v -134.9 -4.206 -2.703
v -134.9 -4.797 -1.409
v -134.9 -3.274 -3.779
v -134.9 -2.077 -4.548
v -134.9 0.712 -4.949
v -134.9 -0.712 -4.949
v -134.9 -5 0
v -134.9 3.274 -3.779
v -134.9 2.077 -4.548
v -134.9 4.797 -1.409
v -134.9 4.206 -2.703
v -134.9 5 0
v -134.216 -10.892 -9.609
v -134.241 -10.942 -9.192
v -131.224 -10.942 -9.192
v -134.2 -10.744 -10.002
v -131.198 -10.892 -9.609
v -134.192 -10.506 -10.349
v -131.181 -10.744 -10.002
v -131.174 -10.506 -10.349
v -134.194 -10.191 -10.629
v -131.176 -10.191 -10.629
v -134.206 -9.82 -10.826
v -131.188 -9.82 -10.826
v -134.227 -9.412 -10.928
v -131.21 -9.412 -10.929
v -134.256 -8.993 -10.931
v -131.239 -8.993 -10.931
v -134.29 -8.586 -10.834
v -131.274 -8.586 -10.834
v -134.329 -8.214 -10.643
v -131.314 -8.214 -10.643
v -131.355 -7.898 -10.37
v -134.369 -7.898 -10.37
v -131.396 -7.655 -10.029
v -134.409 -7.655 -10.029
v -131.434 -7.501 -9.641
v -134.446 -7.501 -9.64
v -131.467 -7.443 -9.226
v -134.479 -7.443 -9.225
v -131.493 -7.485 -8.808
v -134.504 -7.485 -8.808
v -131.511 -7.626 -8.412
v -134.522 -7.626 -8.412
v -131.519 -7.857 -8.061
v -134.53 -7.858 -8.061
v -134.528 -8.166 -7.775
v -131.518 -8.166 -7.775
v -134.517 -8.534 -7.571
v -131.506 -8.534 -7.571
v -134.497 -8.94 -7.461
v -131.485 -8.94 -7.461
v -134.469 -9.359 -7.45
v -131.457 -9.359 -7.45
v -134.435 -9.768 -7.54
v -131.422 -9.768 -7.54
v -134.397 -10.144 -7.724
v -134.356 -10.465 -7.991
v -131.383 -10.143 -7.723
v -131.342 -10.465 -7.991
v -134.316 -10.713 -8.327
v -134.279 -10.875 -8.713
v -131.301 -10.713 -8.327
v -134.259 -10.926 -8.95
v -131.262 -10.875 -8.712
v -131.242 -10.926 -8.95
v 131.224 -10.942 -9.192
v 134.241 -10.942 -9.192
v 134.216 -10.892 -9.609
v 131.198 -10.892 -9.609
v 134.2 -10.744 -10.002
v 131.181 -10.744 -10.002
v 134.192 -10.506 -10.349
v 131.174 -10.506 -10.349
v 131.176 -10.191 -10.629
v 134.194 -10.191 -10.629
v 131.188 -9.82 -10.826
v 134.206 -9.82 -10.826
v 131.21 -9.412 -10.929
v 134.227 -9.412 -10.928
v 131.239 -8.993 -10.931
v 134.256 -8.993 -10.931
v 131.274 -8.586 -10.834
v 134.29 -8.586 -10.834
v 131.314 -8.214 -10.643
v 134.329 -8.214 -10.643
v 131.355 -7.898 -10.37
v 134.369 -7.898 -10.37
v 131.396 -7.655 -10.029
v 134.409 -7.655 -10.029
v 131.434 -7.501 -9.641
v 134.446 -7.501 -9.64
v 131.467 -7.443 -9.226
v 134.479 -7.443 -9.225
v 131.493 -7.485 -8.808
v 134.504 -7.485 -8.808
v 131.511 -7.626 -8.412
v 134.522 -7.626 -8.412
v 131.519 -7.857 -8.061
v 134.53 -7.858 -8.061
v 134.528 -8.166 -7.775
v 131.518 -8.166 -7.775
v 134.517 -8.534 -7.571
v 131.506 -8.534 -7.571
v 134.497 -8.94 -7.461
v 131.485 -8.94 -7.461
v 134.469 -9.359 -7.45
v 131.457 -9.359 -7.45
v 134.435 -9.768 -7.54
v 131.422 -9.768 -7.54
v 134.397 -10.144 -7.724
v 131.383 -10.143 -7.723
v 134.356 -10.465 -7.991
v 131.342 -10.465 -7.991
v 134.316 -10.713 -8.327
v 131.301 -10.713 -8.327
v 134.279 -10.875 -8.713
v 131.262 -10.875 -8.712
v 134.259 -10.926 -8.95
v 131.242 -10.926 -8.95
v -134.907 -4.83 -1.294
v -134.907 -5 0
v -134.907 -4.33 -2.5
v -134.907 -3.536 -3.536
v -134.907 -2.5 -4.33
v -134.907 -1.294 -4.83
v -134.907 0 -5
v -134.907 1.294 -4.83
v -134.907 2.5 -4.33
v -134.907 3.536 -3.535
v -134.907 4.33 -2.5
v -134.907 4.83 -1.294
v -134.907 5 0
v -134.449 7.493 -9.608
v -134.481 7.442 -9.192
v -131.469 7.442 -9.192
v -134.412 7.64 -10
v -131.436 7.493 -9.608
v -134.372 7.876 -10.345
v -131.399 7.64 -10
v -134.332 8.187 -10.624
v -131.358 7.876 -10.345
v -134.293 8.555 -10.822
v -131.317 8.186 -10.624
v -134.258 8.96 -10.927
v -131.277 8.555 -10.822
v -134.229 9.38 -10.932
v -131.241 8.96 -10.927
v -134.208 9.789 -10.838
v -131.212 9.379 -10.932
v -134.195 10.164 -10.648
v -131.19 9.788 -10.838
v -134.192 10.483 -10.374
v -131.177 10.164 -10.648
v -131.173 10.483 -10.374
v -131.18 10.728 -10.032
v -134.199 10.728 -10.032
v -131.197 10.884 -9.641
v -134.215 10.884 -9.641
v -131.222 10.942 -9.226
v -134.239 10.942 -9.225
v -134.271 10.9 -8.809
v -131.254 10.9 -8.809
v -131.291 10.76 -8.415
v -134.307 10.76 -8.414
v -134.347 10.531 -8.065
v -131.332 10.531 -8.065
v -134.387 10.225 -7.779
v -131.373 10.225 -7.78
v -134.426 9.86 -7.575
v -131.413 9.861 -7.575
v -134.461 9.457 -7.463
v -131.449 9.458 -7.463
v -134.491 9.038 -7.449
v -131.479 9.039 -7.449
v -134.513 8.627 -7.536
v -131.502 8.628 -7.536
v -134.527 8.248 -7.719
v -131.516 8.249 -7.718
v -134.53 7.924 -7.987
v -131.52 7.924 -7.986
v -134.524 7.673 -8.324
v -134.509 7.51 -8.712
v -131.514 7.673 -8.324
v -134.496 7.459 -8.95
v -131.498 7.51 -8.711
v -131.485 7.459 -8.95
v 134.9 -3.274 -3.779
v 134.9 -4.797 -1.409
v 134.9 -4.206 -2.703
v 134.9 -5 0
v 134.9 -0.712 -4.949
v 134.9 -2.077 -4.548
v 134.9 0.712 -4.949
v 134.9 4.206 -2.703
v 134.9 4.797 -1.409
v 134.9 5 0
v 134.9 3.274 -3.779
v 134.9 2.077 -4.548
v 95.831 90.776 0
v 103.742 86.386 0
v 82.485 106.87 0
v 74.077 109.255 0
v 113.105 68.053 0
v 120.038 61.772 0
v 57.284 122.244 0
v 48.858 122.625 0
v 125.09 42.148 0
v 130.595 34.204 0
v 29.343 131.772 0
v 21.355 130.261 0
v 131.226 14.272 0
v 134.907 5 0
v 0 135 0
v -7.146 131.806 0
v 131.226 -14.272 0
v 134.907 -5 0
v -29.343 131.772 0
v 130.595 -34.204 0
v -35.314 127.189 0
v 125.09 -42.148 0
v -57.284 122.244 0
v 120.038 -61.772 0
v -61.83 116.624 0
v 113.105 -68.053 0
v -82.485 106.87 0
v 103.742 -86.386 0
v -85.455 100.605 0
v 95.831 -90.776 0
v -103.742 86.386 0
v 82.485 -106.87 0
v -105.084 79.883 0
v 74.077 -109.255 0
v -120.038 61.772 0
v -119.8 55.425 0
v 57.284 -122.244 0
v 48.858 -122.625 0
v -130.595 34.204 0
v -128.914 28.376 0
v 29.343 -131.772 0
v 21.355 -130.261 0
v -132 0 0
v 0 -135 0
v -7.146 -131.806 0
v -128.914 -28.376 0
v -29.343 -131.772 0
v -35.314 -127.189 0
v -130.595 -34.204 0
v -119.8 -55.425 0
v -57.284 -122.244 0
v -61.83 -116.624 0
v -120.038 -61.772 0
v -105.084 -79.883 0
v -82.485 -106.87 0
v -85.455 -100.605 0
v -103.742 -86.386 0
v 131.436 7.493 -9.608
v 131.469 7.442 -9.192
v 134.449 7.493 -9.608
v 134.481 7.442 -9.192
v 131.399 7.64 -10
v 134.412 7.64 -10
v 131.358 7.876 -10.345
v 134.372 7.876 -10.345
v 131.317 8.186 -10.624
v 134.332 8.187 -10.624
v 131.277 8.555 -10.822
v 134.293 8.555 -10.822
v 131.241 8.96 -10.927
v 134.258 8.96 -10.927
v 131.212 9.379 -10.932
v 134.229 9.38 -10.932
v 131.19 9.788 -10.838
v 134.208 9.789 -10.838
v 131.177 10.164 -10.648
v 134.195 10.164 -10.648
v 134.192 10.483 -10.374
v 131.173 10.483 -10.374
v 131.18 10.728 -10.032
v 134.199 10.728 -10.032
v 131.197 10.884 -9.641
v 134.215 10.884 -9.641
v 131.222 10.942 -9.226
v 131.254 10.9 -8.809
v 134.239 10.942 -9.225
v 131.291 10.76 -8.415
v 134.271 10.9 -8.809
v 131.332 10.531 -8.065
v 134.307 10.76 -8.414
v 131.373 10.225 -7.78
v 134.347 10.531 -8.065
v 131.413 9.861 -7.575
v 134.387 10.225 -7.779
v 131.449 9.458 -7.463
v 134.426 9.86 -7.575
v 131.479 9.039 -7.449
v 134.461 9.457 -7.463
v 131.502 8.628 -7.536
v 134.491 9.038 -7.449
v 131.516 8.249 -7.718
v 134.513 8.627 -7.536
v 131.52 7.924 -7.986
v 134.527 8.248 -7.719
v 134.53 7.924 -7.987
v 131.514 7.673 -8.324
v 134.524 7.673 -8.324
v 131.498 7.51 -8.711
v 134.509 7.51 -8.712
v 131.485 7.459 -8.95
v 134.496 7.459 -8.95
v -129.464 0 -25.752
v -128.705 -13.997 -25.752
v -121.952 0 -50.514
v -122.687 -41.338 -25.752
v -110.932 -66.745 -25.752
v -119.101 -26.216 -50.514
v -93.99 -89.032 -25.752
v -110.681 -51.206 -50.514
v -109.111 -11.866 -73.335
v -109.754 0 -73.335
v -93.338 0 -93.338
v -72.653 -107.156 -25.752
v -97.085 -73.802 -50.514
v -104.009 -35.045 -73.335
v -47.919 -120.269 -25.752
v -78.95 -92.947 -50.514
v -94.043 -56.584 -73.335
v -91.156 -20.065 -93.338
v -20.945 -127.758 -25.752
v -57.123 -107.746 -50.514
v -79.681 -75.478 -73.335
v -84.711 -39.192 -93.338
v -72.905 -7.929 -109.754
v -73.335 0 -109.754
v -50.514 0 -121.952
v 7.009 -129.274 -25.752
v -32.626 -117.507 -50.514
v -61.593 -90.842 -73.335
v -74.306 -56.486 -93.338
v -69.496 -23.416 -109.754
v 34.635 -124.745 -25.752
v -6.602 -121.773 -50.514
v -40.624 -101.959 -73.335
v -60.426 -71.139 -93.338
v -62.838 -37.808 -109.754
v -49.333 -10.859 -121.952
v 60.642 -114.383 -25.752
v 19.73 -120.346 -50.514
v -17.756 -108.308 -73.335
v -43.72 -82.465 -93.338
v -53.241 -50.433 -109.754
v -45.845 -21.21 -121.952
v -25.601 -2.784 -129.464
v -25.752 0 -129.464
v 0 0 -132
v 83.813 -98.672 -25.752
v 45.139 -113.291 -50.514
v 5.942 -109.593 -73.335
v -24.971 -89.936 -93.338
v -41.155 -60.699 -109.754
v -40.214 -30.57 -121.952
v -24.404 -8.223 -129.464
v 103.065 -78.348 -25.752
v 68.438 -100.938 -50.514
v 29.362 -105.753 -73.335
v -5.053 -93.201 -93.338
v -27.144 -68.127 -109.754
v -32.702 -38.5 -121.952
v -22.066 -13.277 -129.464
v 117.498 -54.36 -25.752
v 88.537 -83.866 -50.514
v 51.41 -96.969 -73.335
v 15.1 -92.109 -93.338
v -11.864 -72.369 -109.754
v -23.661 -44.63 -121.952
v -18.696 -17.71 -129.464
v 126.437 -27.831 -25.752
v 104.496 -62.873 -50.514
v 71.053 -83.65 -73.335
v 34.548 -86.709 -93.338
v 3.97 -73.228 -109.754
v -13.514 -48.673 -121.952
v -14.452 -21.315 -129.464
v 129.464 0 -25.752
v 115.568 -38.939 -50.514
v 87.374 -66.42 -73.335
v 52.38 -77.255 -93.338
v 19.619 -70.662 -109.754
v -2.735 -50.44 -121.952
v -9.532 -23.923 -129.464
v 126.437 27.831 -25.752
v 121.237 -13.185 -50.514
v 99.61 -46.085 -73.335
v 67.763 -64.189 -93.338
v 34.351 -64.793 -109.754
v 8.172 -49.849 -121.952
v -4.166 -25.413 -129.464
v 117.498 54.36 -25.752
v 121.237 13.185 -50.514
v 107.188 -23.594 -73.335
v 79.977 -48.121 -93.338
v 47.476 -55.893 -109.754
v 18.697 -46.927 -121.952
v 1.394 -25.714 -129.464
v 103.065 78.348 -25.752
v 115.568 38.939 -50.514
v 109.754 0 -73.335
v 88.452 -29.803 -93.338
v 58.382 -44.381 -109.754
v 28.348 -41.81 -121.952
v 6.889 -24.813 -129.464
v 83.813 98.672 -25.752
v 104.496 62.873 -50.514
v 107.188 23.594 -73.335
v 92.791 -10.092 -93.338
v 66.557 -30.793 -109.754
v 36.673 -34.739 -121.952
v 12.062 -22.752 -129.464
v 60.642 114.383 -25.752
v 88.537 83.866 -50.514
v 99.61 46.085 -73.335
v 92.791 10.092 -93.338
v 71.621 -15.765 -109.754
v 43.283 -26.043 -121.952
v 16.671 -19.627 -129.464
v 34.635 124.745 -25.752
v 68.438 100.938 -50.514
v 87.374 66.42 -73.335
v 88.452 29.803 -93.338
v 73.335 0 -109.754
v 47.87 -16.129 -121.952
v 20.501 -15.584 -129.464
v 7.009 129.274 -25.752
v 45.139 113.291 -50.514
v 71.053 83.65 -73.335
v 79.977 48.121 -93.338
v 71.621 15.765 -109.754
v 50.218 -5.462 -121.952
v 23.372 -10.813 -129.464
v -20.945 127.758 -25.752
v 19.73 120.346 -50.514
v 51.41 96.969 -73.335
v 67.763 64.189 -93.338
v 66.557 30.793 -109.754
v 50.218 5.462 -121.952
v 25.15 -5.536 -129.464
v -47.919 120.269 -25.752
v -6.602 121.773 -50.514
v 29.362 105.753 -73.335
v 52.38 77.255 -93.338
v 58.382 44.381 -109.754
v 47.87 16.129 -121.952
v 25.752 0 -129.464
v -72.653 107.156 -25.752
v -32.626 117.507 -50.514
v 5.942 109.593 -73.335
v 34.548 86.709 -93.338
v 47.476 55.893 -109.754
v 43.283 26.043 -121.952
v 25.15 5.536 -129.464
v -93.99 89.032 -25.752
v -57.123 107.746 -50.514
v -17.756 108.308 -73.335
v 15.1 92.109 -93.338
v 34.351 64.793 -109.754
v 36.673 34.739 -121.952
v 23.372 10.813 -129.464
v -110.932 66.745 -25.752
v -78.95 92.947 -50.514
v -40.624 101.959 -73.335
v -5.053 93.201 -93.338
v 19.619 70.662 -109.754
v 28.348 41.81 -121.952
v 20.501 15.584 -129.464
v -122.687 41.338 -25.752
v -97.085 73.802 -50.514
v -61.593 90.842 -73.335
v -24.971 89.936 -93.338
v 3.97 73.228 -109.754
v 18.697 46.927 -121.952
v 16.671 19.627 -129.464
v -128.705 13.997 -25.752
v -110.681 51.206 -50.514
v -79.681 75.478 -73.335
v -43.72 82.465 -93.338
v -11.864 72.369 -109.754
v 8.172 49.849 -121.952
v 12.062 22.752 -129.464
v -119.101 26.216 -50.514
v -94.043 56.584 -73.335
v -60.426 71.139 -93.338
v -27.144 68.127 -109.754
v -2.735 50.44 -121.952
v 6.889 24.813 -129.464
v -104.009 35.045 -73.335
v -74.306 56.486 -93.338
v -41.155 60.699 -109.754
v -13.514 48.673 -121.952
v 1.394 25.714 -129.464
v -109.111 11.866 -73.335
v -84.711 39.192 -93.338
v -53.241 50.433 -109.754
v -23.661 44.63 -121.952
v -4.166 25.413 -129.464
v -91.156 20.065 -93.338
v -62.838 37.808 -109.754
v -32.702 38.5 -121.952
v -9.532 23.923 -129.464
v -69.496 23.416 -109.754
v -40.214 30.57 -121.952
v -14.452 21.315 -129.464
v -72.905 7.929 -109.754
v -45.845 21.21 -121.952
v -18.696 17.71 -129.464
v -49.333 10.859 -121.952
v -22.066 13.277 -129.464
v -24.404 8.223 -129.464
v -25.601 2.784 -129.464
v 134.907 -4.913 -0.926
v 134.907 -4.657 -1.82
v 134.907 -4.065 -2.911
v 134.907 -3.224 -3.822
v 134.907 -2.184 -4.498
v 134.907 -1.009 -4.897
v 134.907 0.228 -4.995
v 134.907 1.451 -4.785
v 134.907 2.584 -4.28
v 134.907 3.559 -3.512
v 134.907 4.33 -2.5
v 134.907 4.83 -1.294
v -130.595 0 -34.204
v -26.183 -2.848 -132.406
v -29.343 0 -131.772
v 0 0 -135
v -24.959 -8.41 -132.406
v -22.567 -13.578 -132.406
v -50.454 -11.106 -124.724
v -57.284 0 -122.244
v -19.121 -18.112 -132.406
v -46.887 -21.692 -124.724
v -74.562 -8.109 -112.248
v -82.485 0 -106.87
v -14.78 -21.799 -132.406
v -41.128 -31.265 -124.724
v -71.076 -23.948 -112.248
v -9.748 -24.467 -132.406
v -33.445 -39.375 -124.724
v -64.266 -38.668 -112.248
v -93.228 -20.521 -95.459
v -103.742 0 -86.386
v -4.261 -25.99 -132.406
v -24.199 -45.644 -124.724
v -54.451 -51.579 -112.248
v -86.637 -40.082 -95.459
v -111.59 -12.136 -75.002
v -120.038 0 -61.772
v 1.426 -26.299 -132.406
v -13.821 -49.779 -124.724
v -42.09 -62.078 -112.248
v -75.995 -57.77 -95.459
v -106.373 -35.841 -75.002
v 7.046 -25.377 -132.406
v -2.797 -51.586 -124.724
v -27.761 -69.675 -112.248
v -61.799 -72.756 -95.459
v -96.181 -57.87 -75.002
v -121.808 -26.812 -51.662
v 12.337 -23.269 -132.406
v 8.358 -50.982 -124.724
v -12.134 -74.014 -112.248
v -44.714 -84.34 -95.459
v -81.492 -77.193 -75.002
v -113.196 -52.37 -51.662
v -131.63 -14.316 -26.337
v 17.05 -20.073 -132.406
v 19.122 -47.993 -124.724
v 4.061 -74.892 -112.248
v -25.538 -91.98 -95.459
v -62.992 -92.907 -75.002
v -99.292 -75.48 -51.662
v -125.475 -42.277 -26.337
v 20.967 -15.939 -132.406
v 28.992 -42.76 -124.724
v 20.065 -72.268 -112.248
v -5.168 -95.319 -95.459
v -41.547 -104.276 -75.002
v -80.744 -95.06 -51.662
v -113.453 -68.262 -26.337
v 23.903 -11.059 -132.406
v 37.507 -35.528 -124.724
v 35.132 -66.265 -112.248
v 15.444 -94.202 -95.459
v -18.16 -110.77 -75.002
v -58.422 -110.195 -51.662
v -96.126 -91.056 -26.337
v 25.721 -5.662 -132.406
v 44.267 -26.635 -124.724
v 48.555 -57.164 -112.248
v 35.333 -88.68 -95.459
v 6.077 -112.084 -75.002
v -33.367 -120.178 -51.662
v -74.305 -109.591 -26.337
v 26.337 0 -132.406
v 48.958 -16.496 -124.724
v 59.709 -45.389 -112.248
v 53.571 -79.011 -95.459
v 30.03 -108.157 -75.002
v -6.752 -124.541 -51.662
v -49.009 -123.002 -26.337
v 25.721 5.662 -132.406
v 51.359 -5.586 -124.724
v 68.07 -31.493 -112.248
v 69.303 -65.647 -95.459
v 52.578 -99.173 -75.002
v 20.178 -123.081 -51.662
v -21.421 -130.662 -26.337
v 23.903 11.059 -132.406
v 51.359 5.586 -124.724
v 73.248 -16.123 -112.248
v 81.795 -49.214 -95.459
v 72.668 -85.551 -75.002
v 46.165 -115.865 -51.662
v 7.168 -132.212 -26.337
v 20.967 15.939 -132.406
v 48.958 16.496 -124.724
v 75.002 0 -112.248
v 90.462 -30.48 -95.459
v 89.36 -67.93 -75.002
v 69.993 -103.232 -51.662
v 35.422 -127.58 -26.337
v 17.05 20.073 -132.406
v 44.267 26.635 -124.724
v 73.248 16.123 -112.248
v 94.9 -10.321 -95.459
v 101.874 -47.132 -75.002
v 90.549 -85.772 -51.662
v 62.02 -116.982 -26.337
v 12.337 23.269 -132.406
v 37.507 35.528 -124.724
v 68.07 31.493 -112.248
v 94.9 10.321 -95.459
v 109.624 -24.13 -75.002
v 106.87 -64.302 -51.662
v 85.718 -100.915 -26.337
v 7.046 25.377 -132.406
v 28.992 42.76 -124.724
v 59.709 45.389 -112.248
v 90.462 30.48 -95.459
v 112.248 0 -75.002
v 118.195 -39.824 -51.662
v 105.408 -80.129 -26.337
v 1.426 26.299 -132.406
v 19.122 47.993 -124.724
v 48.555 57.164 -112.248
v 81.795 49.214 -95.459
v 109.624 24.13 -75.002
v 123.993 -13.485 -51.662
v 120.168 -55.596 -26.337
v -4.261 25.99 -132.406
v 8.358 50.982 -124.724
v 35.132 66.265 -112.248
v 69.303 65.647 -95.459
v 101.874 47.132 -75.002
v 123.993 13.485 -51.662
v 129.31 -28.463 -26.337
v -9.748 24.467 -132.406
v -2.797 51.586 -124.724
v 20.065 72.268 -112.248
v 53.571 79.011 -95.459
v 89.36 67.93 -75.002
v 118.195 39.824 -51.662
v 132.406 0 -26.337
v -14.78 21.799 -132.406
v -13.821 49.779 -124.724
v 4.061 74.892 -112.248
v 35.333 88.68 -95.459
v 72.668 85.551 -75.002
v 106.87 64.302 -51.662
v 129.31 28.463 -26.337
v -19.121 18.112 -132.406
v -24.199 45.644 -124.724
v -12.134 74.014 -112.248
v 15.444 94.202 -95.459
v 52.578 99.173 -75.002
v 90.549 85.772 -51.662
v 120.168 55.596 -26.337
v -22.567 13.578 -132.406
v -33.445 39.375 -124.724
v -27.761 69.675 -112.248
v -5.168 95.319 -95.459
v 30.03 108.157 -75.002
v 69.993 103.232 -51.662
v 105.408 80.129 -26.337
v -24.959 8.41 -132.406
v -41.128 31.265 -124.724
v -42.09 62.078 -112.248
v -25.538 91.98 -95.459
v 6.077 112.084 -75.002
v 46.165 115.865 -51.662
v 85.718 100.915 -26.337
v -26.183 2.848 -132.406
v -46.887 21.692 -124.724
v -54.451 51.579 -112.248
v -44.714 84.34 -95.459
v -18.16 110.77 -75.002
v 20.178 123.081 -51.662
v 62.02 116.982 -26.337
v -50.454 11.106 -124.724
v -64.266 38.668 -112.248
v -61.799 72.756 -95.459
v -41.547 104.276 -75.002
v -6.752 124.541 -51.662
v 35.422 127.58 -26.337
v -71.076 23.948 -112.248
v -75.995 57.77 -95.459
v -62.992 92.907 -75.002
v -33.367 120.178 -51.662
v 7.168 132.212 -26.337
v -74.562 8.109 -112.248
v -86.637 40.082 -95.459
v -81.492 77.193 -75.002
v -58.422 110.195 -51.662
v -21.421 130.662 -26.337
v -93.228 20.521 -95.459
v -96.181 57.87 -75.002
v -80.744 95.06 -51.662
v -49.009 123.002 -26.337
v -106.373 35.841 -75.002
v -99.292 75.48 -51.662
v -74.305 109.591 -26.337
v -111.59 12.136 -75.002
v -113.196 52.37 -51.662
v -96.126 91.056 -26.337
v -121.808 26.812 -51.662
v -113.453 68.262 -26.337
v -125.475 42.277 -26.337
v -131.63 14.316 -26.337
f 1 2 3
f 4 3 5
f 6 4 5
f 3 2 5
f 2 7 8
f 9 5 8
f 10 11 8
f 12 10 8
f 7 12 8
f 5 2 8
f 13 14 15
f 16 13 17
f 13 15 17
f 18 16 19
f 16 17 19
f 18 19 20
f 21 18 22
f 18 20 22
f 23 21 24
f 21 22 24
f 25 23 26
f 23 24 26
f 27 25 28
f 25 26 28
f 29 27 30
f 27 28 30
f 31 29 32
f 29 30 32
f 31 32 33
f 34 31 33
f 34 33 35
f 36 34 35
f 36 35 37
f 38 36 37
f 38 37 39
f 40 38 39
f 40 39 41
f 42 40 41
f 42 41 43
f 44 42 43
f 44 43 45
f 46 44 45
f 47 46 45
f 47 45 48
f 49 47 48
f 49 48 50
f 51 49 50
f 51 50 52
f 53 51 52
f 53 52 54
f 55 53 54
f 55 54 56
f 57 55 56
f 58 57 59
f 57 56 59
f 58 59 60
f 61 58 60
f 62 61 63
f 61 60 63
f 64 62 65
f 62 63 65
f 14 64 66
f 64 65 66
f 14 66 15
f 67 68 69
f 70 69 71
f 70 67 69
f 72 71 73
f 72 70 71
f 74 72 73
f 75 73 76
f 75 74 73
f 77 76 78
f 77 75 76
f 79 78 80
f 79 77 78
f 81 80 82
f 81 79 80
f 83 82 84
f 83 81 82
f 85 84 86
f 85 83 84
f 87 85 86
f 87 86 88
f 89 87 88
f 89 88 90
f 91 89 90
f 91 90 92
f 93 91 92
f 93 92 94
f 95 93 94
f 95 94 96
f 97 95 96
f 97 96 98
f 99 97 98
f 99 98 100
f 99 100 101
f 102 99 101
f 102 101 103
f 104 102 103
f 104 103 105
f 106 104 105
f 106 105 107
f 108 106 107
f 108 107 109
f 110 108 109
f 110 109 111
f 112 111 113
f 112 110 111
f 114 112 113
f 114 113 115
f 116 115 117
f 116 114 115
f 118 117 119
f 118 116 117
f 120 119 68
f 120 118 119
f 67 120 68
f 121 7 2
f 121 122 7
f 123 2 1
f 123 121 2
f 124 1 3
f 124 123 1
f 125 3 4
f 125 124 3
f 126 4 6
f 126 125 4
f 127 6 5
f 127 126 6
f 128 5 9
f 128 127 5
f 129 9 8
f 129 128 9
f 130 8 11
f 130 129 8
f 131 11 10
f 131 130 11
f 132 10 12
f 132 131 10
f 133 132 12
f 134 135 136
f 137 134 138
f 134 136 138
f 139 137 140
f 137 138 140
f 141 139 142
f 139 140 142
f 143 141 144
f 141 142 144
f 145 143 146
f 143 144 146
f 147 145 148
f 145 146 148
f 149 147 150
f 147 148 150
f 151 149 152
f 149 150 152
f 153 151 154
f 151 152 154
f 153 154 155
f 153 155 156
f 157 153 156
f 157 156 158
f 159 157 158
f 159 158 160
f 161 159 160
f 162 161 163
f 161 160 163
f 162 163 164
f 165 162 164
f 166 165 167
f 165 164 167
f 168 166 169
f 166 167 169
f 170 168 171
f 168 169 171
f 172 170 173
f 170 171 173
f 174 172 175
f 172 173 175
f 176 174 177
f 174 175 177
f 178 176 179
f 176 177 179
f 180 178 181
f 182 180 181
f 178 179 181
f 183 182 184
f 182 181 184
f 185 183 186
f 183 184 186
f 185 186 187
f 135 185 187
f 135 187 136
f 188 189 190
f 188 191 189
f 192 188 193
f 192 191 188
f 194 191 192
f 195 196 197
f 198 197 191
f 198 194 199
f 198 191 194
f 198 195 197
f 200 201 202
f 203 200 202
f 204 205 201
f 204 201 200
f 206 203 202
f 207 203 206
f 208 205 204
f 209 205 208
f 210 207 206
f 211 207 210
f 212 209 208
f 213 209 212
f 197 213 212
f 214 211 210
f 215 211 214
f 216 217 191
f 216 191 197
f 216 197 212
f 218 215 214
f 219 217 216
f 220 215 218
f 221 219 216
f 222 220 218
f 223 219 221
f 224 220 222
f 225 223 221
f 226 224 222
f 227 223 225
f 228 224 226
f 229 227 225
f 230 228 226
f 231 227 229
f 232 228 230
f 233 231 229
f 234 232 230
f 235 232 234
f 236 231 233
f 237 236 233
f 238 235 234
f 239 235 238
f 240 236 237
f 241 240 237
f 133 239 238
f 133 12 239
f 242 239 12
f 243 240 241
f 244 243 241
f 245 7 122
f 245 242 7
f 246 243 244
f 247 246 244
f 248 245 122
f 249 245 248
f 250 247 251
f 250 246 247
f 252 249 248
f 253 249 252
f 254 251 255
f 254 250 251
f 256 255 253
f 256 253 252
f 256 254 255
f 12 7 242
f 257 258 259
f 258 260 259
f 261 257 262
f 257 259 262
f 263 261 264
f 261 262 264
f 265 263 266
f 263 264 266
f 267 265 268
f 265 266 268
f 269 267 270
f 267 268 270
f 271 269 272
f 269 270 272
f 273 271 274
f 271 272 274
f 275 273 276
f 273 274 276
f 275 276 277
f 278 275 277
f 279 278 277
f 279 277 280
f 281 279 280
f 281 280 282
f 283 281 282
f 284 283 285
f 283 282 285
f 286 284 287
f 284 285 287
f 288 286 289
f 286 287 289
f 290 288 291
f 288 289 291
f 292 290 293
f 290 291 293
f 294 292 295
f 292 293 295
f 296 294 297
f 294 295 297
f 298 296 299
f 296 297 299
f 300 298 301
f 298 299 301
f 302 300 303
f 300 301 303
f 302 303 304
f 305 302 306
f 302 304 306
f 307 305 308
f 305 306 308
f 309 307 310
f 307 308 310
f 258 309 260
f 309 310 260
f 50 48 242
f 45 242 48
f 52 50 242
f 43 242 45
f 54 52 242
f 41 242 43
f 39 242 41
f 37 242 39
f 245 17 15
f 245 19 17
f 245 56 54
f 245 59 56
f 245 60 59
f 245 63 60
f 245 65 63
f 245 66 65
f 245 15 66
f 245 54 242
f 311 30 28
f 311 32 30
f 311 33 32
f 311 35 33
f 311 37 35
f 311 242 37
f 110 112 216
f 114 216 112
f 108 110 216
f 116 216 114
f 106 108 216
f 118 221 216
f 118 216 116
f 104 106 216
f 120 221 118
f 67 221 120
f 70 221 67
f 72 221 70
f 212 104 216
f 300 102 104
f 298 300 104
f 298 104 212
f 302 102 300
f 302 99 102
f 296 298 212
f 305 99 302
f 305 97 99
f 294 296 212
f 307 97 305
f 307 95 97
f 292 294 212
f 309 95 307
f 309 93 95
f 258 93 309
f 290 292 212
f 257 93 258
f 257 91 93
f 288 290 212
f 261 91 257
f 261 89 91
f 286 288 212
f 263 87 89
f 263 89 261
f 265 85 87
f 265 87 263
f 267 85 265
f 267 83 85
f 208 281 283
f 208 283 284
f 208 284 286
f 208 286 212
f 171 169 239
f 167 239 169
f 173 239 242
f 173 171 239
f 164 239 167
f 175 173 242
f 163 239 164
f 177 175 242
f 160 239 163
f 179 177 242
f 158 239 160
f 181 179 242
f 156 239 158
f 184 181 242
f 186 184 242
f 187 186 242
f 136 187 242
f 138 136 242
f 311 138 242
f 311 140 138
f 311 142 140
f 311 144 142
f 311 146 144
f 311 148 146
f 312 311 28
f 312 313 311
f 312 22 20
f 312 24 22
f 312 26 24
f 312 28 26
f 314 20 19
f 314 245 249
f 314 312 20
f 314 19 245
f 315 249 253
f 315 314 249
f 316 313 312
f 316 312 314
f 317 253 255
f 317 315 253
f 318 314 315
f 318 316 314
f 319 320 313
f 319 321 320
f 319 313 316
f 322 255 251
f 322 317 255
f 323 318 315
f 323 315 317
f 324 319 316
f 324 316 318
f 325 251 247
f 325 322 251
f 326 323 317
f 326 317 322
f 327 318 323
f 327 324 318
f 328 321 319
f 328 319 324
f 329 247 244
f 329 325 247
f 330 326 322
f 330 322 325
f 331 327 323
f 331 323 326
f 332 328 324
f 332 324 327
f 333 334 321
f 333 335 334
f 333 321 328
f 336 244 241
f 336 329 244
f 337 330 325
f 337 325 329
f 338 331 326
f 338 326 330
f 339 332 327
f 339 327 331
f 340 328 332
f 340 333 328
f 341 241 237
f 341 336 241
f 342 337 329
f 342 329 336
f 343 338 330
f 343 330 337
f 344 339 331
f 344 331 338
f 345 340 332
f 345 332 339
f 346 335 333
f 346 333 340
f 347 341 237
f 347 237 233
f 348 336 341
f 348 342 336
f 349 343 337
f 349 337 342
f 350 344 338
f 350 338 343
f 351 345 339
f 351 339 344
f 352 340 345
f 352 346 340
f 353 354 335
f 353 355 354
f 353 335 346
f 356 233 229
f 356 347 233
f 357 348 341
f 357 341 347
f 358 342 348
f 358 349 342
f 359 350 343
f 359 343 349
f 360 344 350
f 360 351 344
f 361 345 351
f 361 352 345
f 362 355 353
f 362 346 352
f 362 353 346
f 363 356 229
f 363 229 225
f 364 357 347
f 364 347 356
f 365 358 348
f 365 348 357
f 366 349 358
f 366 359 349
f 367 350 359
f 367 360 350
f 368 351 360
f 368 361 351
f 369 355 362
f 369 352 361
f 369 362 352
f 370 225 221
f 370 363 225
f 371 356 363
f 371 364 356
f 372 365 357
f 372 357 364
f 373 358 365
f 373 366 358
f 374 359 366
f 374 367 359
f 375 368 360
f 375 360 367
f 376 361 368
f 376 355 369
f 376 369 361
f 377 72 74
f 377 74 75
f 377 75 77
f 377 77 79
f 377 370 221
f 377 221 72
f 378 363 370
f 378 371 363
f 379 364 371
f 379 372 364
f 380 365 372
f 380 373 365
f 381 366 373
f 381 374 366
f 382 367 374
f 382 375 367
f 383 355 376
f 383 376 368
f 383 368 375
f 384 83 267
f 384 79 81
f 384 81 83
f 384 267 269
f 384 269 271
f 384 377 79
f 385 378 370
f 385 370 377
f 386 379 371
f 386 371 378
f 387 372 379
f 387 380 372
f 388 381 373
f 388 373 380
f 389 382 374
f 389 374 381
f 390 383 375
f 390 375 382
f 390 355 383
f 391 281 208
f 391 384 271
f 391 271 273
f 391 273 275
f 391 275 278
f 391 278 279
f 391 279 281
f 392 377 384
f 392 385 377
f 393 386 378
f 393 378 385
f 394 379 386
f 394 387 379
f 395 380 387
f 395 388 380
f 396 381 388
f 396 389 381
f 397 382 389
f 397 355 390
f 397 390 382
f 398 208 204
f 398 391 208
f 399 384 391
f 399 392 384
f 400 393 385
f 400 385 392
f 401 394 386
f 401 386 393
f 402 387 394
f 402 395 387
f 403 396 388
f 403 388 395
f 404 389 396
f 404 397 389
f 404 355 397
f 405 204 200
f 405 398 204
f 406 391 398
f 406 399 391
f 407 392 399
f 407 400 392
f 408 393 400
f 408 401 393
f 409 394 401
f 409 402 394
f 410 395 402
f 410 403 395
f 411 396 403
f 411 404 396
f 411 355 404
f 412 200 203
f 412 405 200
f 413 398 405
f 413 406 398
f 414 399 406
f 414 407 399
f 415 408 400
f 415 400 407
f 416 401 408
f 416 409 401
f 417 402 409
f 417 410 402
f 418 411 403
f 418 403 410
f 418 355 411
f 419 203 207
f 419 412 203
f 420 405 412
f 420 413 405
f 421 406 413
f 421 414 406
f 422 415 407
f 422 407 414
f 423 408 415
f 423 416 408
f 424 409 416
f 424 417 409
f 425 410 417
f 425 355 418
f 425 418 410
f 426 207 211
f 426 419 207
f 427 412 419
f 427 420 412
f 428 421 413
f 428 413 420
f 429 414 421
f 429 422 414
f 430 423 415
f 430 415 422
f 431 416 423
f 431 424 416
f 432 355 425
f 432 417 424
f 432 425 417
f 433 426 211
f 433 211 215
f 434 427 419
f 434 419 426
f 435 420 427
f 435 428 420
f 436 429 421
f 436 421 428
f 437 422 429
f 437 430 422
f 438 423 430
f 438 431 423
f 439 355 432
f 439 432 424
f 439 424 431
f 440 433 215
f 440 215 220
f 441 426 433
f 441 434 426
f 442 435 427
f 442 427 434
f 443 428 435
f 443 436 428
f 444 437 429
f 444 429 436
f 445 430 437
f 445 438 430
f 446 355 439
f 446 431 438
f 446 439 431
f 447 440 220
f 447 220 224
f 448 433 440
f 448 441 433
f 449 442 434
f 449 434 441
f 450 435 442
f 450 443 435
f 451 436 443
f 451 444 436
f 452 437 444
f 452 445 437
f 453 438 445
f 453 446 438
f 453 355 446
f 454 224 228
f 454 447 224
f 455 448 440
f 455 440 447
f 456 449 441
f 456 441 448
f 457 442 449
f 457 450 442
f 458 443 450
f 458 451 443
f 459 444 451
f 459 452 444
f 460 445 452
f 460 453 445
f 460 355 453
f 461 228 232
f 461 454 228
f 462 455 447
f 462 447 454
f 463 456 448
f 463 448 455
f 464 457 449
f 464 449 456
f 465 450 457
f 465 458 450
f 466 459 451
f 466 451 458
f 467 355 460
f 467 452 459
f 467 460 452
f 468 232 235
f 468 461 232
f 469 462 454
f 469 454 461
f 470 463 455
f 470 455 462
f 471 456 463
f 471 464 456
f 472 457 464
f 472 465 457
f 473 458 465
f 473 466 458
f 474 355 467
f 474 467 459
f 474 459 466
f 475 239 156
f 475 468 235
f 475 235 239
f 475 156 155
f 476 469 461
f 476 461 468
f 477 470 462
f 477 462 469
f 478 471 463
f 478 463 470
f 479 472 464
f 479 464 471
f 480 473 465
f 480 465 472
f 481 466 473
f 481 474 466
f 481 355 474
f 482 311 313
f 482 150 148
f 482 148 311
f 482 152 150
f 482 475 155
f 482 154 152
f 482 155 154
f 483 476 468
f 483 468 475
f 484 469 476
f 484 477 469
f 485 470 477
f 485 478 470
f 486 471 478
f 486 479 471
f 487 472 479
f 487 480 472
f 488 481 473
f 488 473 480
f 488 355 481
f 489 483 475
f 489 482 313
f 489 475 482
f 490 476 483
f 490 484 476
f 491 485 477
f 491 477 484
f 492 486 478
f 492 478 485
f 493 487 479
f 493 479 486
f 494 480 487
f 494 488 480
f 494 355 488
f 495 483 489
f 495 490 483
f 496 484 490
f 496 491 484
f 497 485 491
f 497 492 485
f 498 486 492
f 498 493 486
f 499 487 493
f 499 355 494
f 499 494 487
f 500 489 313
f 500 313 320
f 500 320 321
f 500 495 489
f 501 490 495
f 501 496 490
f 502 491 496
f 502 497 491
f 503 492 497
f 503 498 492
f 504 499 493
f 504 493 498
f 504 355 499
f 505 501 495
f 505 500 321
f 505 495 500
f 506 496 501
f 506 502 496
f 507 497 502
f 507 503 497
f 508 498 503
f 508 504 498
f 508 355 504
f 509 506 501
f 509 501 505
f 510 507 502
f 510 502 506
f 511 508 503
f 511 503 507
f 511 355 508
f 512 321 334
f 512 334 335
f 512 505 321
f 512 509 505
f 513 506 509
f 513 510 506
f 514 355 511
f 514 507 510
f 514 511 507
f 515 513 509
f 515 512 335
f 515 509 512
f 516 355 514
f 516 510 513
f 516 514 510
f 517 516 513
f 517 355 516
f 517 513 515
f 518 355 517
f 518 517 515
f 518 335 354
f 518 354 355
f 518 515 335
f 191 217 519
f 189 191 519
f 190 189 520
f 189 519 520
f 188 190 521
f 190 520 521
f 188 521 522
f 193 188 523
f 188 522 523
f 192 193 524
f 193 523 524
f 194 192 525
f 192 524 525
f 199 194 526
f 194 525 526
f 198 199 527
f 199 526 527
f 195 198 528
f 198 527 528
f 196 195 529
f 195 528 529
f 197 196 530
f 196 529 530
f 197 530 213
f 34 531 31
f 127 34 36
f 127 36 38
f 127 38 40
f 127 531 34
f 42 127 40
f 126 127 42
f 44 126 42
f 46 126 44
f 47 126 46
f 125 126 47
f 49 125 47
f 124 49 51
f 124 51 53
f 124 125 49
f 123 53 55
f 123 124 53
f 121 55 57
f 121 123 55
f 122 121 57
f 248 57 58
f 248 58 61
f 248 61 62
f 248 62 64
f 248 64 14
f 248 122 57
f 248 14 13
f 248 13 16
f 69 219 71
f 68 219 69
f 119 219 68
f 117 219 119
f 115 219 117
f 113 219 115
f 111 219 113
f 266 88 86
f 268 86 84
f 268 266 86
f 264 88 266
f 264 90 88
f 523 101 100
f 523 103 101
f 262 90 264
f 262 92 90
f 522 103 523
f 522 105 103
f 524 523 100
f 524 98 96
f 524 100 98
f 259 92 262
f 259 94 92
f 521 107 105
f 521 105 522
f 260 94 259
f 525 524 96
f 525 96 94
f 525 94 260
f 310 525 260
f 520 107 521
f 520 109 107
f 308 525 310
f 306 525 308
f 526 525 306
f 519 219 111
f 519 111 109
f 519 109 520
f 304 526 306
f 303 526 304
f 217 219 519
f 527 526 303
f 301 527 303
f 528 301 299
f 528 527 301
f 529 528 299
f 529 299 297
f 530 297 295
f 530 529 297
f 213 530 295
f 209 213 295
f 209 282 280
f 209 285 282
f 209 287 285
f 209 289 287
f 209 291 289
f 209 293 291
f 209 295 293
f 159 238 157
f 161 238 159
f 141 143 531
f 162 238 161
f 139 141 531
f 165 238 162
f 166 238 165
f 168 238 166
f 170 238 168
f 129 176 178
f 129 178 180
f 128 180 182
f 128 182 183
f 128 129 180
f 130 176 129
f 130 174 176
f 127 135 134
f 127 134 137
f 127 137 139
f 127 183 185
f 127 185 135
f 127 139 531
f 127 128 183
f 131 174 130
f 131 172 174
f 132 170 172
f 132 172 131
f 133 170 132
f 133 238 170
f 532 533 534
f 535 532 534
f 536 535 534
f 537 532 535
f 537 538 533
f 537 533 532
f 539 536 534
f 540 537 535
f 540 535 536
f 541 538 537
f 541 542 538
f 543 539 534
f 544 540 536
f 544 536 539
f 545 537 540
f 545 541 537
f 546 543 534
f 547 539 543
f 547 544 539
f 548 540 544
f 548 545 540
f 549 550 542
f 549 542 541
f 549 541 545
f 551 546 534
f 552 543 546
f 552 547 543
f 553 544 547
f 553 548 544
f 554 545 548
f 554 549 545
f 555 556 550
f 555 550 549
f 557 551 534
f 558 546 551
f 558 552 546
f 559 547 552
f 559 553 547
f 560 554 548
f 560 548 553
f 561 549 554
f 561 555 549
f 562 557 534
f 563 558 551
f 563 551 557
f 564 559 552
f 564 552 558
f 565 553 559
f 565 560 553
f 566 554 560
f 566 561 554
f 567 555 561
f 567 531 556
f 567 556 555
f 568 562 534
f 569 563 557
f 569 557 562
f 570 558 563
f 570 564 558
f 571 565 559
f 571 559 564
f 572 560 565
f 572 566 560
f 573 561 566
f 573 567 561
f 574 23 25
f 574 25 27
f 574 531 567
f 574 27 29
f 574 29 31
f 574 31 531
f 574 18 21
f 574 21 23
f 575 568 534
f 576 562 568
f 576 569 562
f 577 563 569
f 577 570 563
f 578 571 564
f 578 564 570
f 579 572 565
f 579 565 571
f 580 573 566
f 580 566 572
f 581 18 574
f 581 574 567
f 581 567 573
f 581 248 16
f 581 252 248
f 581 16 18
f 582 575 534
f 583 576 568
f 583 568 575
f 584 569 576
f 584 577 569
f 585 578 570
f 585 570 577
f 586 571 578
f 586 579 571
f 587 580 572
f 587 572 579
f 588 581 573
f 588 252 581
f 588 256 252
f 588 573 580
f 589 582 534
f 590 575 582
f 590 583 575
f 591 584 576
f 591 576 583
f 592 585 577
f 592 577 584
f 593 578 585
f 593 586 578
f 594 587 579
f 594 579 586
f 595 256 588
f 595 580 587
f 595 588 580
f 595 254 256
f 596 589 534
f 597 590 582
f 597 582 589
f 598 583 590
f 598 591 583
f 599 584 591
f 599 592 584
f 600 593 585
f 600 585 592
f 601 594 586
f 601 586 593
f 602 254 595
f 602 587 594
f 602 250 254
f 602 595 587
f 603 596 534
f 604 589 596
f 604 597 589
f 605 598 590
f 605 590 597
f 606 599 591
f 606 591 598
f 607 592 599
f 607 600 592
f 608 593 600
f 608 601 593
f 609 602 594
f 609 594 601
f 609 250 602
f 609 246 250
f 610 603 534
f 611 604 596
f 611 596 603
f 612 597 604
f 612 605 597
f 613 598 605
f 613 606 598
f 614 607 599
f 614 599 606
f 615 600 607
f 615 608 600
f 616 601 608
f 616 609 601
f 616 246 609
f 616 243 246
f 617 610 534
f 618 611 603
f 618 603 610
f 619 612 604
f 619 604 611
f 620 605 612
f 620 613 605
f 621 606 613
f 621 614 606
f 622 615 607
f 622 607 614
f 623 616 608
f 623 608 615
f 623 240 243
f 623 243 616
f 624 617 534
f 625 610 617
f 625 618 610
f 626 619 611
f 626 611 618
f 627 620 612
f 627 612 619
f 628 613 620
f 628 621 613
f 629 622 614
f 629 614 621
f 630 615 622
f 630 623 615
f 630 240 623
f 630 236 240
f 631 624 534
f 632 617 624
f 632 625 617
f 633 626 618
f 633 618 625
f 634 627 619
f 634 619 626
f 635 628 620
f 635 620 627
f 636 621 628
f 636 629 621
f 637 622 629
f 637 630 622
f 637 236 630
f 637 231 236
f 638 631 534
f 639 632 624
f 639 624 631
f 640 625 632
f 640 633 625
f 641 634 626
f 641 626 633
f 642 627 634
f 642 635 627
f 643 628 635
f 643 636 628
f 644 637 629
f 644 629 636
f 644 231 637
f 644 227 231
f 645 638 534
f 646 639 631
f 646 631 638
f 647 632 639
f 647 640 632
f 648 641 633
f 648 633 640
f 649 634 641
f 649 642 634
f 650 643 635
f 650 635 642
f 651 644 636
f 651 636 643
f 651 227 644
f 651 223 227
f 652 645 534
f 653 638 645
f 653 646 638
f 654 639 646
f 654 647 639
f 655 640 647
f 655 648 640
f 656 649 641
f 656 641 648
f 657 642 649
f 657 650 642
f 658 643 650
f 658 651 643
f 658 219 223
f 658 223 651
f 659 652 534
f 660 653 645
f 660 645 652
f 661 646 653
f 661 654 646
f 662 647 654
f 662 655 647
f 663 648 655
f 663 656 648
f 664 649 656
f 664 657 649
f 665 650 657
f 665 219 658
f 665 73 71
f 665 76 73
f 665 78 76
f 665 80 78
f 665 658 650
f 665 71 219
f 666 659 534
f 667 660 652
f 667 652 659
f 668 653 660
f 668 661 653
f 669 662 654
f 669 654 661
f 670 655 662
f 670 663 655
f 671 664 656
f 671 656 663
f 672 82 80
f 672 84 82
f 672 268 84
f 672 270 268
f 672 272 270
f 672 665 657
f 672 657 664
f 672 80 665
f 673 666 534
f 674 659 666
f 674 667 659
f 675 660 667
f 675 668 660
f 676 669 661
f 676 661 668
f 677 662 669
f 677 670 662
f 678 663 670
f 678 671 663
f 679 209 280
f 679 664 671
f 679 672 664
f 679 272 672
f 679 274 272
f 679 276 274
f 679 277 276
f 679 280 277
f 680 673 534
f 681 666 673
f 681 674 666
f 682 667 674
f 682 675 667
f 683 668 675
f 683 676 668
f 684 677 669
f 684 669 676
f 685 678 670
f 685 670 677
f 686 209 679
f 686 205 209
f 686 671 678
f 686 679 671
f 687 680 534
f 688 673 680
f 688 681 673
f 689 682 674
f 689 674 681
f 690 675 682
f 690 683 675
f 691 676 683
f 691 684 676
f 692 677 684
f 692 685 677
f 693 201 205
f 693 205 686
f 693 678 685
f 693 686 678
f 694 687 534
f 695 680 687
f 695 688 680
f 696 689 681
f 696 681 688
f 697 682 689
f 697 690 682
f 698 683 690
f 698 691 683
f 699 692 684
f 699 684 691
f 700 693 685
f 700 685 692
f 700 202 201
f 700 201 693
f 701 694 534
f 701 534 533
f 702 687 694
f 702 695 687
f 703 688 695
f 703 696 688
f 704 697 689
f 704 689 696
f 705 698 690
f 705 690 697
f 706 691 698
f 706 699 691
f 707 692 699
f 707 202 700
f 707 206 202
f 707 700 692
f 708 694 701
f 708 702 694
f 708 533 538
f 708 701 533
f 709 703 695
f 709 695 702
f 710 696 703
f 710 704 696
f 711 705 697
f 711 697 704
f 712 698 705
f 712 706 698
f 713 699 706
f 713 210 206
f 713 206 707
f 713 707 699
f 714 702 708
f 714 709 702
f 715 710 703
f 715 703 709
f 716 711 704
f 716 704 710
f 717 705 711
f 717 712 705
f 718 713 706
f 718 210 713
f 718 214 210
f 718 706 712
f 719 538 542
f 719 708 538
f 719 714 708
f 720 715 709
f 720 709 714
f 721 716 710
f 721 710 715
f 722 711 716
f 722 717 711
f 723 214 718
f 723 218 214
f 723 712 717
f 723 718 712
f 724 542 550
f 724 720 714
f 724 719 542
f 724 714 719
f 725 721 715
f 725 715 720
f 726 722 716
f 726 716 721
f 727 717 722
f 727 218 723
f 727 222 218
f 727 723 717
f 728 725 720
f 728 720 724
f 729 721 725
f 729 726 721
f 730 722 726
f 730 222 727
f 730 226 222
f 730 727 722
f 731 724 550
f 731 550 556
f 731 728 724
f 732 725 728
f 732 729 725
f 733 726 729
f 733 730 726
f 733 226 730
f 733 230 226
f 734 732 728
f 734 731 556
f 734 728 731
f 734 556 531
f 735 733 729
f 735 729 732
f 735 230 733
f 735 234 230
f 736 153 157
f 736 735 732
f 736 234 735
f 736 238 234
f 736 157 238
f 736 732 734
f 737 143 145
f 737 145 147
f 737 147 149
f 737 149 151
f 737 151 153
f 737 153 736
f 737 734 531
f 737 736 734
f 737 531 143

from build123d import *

# Parameters (mm, degrees)
SKETCH_3_R          = 1.75
CUT_EXTRUDE_2_DEPTH = 211.5
SKETCH_4_R          = 5
CUT_EXTRUDE_3_DEPTH = 0.1


with BuildPart() as part:
    # Эскиз2 → Повернуть1 (revolve)
    with BuildSketch(Plane(origin=(0, 0, 0), x_dir=(1, 0, 0), z_dir=(0, 1, 0))):
        with BuildLine():
            Line((-135, 0), (-132, 0))
            ThreePointArc((-132, 0), (-93.338095117, 93.338095117), (0, 132))
            Line((0, 132), (0, 135))
            ThreePointArc((0, 135), (-95.45941546, 95.45941546), (-135, 0))
        make_face()
    revolve(axis=Axis((0, 0, -135), (0, 0, 1)))

    # Эскиз3 → Вырез-Вытянуть2 (cut, symmetric)
    with BuildSketch(Plane(origin=(0, 0, 0), x_dir=(0, -1, 0), z_dir=(1, 0, 0))):
        with Locations((9.192388155, 9.192388155)):
            Circle(SKETCH_3_R)
        with Locations((-9.192388155, 9.192388155)):
            Circle(SKETCH_3_R)
    extrude(amount=CUT_EXTRUDE_2_DEPTH, both=True, mode=Mode.SUBTRACT)

    # Эскиз4 → Вырез-Вытянуть3 (cut)
    with BuildSketch(Plane(origin=(135, 0, 0), x_dir=(0, 0, -1), z_dir=(1, 0, 0))):
        Circle(SKETCH_4_R)
    cut_extrude_3 = extrude(amount=-CUT_EXTRUDE_3_DEPTH, mode=Mode.SUBTRACT)

    # Зеркальное отражение1: Вырез-Вытянуть3 across plane
    add(cut_extrude_3.mirror(Plane(origin=(0, 0, 0), x_dir=(0, 0, 1), z_dir=(1, 0, 0))), mode=Mode.SUBTRACT)


solid = part.part
